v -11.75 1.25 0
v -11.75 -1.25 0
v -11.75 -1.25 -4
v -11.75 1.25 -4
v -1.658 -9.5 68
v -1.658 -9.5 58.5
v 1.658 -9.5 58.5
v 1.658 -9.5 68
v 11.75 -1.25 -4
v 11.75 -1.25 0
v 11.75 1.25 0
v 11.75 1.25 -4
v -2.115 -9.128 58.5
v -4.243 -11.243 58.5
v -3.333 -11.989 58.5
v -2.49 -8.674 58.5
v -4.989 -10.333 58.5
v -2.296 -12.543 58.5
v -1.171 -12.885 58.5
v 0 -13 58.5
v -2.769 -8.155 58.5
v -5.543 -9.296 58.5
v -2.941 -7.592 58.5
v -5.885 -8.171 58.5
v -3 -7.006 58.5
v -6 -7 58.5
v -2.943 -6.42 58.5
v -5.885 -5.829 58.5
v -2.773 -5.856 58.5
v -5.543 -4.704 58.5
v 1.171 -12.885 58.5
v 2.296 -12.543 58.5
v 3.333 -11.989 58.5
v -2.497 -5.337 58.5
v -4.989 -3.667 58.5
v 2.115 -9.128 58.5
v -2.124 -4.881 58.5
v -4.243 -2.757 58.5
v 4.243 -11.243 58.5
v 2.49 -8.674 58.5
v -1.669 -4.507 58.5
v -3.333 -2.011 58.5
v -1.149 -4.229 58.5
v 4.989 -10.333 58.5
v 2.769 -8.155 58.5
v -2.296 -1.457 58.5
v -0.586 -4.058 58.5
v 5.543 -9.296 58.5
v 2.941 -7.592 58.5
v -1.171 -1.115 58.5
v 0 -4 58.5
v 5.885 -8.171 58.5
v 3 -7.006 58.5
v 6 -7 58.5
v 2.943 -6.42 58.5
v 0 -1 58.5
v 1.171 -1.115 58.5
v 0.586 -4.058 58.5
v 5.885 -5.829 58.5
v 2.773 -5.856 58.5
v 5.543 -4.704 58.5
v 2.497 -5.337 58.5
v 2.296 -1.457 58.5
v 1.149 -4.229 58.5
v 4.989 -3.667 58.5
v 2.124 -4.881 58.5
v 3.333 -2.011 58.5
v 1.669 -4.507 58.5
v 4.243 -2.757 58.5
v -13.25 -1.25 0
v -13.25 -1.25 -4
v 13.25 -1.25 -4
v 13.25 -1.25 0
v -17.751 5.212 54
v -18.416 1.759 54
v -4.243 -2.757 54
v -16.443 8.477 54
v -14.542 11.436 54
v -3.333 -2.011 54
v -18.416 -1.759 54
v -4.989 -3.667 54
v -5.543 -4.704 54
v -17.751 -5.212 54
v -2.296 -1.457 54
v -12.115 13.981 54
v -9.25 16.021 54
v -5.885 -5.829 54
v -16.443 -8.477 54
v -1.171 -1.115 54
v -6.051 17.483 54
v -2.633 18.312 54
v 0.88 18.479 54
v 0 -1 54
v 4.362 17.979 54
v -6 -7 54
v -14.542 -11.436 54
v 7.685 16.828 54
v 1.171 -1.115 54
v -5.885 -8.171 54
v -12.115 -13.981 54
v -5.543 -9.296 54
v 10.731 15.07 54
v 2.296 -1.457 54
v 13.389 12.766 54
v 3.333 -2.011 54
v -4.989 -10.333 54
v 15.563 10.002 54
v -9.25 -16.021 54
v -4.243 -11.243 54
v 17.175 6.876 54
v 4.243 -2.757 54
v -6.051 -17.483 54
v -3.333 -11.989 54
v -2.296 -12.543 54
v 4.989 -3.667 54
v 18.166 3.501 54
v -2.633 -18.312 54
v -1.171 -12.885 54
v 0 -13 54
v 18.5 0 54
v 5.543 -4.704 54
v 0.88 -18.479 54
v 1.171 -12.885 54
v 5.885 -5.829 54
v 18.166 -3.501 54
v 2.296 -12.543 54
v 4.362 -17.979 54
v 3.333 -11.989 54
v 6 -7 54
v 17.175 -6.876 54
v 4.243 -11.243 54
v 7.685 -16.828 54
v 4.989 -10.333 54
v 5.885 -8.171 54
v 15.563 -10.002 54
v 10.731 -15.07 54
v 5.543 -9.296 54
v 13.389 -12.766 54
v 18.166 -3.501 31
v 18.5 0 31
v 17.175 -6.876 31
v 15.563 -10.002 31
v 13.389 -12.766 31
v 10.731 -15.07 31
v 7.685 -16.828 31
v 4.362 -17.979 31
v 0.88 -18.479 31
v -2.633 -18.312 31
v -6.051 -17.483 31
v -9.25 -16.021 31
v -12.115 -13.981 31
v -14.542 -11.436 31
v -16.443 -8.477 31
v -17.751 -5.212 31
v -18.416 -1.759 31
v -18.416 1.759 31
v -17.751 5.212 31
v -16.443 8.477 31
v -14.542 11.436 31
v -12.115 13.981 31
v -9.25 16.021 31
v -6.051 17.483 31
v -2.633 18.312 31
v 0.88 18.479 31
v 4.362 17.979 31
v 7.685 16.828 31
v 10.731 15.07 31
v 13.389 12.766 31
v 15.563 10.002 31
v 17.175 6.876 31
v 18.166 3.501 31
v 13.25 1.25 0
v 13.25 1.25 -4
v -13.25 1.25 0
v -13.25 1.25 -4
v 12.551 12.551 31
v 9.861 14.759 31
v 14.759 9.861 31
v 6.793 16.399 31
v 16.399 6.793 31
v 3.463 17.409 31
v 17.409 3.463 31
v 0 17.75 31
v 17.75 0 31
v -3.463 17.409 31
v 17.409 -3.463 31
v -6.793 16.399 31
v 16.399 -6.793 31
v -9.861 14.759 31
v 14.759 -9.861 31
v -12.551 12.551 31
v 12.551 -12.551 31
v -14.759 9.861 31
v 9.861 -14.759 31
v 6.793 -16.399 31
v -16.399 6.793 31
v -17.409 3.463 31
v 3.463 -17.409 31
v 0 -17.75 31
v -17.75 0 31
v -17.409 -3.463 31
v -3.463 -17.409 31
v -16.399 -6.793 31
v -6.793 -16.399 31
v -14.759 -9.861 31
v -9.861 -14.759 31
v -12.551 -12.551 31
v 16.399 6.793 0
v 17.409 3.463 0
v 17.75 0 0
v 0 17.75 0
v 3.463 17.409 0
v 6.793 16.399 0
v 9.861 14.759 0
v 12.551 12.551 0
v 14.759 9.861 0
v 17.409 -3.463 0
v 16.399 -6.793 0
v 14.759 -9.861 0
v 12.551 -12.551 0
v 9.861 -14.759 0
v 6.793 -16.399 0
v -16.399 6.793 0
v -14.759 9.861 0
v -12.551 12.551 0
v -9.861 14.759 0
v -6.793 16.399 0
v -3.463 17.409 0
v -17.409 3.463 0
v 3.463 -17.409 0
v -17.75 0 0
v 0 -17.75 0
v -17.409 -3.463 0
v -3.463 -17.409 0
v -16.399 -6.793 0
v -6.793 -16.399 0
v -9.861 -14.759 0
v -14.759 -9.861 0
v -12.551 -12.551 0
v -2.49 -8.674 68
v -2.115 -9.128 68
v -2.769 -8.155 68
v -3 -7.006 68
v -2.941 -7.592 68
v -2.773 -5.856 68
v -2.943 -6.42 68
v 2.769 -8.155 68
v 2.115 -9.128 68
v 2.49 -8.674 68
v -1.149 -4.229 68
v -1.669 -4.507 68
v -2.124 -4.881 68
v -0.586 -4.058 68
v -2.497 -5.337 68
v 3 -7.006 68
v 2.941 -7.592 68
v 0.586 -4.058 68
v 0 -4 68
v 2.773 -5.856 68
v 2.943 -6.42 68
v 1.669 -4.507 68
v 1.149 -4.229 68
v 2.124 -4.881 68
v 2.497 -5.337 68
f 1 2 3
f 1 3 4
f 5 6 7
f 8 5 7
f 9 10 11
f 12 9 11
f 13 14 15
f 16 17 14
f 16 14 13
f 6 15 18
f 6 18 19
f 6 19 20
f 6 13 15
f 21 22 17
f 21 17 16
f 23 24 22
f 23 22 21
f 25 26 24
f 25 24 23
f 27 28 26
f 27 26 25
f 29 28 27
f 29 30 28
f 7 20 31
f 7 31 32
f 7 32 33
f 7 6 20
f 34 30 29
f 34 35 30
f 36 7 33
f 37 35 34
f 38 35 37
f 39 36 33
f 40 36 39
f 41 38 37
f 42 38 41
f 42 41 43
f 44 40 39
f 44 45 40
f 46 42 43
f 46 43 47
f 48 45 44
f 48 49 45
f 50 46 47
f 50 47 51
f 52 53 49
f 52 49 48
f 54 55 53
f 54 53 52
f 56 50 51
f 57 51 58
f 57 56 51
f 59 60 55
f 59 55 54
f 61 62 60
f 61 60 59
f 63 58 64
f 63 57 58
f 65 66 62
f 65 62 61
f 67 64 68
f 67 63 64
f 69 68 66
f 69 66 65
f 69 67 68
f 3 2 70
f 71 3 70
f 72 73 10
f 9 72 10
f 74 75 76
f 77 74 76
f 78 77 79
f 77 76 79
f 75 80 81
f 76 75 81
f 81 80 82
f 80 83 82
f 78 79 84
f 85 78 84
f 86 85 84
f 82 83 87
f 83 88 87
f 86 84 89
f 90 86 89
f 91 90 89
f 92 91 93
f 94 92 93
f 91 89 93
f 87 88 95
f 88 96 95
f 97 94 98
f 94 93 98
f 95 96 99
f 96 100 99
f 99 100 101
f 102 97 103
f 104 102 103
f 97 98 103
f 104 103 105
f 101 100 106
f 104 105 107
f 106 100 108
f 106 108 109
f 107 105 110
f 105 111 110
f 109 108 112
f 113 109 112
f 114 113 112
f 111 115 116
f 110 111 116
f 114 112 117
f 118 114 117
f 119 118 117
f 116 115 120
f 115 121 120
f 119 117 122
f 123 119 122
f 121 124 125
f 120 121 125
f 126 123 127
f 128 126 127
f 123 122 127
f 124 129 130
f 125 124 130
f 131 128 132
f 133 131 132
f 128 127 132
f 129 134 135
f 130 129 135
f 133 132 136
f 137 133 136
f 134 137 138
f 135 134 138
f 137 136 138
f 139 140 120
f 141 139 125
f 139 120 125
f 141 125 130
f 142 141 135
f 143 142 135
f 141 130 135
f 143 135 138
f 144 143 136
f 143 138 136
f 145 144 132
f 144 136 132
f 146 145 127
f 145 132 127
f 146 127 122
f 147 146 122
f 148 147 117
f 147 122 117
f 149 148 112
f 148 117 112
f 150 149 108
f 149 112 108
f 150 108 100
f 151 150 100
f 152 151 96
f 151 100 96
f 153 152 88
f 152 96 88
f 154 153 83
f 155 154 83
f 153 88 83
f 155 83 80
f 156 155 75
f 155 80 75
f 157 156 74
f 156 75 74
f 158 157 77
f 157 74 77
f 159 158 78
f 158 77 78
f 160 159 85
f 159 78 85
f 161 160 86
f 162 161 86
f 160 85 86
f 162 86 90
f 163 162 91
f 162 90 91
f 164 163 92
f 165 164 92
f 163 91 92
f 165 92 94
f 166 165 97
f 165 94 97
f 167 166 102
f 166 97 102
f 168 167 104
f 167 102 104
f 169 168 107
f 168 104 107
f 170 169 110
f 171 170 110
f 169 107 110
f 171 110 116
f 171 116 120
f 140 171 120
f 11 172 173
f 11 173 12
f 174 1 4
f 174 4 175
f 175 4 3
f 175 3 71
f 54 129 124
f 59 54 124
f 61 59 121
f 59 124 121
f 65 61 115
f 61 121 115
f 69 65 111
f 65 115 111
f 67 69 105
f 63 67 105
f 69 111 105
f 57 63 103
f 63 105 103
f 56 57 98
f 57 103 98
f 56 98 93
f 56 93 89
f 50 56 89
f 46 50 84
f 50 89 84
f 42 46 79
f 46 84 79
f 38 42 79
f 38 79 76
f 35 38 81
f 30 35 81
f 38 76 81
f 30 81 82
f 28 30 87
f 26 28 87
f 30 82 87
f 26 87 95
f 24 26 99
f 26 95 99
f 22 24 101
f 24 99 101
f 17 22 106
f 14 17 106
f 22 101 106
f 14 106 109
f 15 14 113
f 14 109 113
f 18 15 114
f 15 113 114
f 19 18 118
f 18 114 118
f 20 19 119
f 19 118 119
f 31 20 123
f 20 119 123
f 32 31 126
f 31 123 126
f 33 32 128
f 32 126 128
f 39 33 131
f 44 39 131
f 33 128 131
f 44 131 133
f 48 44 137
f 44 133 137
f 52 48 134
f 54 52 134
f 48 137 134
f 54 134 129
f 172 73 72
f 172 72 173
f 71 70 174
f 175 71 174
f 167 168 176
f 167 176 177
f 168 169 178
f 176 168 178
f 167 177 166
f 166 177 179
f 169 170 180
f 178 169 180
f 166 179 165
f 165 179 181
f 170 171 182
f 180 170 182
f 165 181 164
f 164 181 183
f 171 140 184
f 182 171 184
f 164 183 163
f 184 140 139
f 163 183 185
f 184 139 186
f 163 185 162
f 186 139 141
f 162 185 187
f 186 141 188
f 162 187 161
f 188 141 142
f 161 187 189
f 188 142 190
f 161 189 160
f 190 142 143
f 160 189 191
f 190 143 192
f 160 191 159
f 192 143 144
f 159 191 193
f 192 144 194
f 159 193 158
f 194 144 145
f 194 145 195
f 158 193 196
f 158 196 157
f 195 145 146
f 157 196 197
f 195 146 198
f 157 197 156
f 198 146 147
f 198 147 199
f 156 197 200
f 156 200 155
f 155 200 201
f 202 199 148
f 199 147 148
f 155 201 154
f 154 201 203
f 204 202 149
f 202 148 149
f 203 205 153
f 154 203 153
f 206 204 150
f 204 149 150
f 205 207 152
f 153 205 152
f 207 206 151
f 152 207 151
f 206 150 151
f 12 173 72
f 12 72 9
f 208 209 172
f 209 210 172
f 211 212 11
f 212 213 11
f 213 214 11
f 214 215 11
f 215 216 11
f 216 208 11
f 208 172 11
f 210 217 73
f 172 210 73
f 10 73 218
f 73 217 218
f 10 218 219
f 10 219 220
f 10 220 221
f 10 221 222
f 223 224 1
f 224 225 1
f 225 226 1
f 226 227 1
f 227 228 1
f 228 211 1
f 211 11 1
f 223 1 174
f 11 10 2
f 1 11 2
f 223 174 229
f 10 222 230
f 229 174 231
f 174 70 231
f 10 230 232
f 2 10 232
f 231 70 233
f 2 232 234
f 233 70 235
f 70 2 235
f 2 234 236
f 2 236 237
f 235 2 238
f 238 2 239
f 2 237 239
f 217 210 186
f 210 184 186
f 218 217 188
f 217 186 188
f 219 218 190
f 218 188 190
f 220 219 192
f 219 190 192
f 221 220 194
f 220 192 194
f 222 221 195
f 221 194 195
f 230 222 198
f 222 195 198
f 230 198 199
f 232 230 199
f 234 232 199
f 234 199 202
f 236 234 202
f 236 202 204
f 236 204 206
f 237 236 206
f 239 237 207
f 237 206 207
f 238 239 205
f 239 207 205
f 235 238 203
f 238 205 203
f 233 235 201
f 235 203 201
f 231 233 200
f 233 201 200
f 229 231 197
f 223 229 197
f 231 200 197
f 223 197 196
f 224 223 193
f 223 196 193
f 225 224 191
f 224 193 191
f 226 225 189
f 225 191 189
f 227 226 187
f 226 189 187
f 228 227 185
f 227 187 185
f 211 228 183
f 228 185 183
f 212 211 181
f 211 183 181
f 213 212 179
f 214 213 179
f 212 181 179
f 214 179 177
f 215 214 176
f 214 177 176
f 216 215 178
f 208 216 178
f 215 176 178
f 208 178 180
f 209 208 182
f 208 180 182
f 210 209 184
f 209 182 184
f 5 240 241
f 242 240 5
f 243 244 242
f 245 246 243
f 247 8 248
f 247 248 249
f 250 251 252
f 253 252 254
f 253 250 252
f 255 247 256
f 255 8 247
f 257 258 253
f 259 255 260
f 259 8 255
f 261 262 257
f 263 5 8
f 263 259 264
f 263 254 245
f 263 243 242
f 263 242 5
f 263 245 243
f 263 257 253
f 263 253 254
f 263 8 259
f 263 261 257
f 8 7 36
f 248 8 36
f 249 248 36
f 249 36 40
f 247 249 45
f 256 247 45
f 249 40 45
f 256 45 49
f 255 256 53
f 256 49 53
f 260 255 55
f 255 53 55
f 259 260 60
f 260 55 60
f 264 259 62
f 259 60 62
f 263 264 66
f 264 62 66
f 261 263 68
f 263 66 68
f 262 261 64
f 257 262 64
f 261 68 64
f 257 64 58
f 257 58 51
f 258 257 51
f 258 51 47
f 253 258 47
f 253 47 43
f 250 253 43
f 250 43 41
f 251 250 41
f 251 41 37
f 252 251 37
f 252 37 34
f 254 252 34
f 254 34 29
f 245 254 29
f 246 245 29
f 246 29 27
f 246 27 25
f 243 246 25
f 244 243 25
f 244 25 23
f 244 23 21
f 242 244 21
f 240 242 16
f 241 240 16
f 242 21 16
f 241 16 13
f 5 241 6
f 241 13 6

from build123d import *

# Parameters (mm, degrees)
SKETCH3_W           = 1.5
SKETCH3_H           = 2.5
BOSS_EXTRUDE1_DEPTH = 4
SKETCH4_R           = 6
BOSS_EXTRUDE2_DEPTH = 4.5
BOSS_EXTRUDE3_DEPTH = 14


with BuildPart() as part:
    # Sketch2 → Revolve1 (revolve)
    with BuildSketch(Plane(origin=(0, 0, 0), x_dir=(1, 0, 0), z_dir=(0, 1, 0))):
        Polygon((0, -54), (0, 0), (17.75, 0), (17.75, -31), (18.5, -31), (18.5, -54), align=None)
    revolve(axis=Axis((0, 0, 54), (0, 0, -1)))

    # Sketch3 → Boss-Extrude1 (add)
    with BuildSketch(Plane(origin=(0, 0, 0), x_dir=(-1, 0, 0), z_dir=(0, 0, -1))):
        with Locations((-12.5, 0)):
            Rectangle(SKETCH3_W, SKETCH3_H)
        with Locations((12.5, 0)):
            Rectangle(SKETCH3_W, SKETCH3_H)
    extrude(amount=BOSS_EXTRUDE1_DEPTH)

    # Sketch4 → Boss-Extrude2 (add)
    with BuildSketch(Plane.XY.offset(54)):
        with Locations((0, -7)):
            Circle(SKETCH4_R)
        with BuildLine():
            Line((-1.658312395, -9.5), (1.658312395, -9.5))
            ThreePointArc((1.658312395, -9.5), (0, -4), (-1.658312395, -9.5))
        make_face(mode=Mode.SUBTRACT)
    extrude(amount=BOSS_EXTRUDE2_DEPTH)

    # Sketch4<2> → Boss-Extrude3 (add)
    with BuildSketch(Plane.XY.offset(54)):
        with BuildLine():
            Line((-1.658312395, -9.5), (1.658312395, -9.5))
            ThreePointArc((1.658312395, -9.5), (0, -4), (-1.658312395, -9.5))
        make_face()
    extrude(amount=BOSS_EXTRUDE3_DEPTH)


solid = part.part
